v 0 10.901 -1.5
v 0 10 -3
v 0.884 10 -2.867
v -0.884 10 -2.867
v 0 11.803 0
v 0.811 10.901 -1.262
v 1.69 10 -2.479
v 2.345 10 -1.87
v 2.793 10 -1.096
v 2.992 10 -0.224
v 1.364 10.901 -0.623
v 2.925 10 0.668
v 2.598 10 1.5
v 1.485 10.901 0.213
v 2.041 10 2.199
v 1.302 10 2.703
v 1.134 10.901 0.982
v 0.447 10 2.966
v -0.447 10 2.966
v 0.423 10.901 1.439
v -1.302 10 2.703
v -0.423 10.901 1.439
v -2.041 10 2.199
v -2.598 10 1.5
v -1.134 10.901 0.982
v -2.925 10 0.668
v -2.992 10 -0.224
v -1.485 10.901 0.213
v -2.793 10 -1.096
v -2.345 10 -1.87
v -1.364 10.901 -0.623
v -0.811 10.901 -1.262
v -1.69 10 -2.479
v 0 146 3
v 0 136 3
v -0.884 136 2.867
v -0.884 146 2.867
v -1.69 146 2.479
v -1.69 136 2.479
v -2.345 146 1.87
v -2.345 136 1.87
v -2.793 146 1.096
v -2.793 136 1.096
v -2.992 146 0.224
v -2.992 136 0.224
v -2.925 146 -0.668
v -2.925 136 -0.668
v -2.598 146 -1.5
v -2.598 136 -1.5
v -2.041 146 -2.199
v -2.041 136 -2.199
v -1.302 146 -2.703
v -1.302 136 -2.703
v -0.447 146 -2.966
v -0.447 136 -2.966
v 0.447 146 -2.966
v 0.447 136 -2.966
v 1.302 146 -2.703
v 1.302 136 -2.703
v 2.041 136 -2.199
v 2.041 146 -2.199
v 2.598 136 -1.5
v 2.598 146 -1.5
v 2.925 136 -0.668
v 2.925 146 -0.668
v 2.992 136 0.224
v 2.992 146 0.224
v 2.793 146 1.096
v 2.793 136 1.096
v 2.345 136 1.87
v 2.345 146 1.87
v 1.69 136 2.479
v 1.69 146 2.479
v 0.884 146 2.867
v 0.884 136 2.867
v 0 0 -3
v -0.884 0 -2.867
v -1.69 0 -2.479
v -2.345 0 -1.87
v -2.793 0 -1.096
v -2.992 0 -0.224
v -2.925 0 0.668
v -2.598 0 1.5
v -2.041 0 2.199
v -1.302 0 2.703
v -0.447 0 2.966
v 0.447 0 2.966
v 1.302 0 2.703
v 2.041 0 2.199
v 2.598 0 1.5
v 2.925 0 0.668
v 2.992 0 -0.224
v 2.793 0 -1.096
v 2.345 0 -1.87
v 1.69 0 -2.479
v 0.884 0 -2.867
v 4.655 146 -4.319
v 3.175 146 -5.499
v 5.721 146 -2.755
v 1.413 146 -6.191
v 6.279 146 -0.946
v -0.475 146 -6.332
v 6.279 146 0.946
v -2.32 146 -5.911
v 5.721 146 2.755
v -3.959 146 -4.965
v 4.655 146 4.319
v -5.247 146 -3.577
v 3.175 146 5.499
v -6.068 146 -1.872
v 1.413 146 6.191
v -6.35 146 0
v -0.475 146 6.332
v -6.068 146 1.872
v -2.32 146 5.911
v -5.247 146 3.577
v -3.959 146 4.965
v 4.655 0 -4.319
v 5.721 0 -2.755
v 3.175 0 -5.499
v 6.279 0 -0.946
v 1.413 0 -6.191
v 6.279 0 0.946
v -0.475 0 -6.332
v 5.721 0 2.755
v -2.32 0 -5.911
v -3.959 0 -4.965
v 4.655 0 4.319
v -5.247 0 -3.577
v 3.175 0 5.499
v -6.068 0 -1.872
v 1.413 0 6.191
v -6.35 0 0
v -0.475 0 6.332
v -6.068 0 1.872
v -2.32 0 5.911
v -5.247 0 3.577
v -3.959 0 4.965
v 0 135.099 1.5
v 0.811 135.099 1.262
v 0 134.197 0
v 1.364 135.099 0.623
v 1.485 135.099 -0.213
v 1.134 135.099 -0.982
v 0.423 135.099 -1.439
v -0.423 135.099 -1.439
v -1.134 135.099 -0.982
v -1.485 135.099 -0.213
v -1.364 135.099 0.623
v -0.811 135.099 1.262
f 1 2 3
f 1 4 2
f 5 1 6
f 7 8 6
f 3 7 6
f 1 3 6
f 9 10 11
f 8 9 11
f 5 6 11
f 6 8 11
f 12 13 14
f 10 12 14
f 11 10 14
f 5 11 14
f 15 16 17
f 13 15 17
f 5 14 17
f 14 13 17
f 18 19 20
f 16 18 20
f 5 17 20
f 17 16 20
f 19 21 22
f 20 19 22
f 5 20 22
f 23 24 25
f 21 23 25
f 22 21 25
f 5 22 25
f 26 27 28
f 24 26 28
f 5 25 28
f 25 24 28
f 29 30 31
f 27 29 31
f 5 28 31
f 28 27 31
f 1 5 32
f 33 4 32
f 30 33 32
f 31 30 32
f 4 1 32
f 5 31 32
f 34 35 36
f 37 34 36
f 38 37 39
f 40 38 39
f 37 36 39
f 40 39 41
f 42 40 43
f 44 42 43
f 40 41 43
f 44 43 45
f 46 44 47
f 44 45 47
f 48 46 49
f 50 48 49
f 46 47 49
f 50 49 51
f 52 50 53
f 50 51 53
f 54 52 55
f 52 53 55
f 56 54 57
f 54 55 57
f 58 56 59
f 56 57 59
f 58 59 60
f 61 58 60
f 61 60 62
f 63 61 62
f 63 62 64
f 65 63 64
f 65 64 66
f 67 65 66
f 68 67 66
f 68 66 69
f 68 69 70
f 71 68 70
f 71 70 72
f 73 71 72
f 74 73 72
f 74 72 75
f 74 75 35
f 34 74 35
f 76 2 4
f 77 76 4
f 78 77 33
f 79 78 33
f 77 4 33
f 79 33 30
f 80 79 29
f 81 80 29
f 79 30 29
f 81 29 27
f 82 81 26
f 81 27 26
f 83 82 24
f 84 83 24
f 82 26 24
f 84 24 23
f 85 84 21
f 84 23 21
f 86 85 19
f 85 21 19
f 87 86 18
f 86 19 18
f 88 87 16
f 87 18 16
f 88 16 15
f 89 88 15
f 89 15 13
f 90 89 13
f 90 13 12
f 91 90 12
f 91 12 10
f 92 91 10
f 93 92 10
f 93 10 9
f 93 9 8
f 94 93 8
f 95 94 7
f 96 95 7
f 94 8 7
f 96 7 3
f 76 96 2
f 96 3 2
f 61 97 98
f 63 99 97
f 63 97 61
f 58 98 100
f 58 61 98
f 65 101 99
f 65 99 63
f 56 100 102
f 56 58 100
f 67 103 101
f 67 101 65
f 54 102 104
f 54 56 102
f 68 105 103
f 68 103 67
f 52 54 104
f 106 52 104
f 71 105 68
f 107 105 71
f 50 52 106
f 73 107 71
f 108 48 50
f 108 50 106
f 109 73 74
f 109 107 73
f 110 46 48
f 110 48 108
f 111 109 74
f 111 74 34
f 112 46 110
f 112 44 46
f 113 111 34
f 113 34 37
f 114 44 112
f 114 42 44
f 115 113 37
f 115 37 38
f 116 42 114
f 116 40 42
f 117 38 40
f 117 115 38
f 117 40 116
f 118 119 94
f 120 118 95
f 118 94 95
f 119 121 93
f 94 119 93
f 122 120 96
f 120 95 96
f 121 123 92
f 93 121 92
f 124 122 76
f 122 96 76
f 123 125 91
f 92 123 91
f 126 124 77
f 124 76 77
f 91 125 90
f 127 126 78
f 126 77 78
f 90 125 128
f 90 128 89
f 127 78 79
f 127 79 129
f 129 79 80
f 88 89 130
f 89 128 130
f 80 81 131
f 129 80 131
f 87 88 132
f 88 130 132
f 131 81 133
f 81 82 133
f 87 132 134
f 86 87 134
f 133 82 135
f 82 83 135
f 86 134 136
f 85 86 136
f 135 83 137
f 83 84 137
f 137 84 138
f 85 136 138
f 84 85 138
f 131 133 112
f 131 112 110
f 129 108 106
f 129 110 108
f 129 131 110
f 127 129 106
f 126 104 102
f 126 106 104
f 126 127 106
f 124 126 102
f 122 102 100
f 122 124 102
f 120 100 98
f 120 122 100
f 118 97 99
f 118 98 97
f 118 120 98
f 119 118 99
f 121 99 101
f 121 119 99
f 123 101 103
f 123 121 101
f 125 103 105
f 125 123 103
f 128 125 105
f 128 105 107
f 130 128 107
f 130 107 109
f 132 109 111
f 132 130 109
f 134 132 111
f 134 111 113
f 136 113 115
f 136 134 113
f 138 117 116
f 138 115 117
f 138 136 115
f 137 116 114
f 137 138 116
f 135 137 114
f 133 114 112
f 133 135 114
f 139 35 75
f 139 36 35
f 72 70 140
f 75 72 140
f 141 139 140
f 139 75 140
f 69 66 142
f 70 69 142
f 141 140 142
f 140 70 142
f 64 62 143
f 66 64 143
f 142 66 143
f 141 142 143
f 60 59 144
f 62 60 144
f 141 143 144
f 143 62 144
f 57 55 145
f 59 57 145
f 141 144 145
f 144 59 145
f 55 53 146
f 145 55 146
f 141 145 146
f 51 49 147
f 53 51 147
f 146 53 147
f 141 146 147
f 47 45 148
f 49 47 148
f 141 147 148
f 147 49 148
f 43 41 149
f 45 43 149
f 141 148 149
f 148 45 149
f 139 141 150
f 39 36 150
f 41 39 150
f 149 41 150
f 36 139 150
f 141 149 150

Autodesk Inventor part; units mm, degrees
ref_plane "YZ Plane" through (0, 0, 0) normal (1, 0, 0) x (0, 1, 0)
ref_plane "XZ Plane" through (0, 0, 0) normal (0, 1, 0) x (-1, 0, 0)
ref_plane "XY Plane" through (0, 0, 0) normal (0, 0, 1) x (1, 0, 0)
sketch "Sketch1" plane through (0, 0, 0) normal (0, 1, 0) x (-1, 0, 0)
  circle A0 centre (0, 0) radius 6.35
  dimension "d0" = 12.7
extrude "Extrusion1" add sketch "Sketch1" along normal blind 146
sketch "Sketch3" plane through (0, 146, 0) normal (0, 1, 0) x (1, 0, 0)
  point P0 (0, 0)
  point P1 (0, 0)
hole "Hole2" at (0, 146, 0) direction (0, -1, 0) diameter 6 depth 10 tip angle 118
thread "Thread3" size "1/4-20 UNC" class "2B" standard "ANSI Unified Screw Threads" full length
sketch "Sketch4" plane through (0, 0, 0) normal (0, -1, 0) x (1, 0, 0)
  circle A0 centre (0, 0) radius 6.35 projected
hole "Hole3" at (0, 0, 0) direction (0, 1, 0) diameter 6 depth 10 tip angle 118
thread "Thread4" size "1/4-20 UNC" class "2B" standard "ANSI Unified Screw Threads" full length
properties part number "Poste"
